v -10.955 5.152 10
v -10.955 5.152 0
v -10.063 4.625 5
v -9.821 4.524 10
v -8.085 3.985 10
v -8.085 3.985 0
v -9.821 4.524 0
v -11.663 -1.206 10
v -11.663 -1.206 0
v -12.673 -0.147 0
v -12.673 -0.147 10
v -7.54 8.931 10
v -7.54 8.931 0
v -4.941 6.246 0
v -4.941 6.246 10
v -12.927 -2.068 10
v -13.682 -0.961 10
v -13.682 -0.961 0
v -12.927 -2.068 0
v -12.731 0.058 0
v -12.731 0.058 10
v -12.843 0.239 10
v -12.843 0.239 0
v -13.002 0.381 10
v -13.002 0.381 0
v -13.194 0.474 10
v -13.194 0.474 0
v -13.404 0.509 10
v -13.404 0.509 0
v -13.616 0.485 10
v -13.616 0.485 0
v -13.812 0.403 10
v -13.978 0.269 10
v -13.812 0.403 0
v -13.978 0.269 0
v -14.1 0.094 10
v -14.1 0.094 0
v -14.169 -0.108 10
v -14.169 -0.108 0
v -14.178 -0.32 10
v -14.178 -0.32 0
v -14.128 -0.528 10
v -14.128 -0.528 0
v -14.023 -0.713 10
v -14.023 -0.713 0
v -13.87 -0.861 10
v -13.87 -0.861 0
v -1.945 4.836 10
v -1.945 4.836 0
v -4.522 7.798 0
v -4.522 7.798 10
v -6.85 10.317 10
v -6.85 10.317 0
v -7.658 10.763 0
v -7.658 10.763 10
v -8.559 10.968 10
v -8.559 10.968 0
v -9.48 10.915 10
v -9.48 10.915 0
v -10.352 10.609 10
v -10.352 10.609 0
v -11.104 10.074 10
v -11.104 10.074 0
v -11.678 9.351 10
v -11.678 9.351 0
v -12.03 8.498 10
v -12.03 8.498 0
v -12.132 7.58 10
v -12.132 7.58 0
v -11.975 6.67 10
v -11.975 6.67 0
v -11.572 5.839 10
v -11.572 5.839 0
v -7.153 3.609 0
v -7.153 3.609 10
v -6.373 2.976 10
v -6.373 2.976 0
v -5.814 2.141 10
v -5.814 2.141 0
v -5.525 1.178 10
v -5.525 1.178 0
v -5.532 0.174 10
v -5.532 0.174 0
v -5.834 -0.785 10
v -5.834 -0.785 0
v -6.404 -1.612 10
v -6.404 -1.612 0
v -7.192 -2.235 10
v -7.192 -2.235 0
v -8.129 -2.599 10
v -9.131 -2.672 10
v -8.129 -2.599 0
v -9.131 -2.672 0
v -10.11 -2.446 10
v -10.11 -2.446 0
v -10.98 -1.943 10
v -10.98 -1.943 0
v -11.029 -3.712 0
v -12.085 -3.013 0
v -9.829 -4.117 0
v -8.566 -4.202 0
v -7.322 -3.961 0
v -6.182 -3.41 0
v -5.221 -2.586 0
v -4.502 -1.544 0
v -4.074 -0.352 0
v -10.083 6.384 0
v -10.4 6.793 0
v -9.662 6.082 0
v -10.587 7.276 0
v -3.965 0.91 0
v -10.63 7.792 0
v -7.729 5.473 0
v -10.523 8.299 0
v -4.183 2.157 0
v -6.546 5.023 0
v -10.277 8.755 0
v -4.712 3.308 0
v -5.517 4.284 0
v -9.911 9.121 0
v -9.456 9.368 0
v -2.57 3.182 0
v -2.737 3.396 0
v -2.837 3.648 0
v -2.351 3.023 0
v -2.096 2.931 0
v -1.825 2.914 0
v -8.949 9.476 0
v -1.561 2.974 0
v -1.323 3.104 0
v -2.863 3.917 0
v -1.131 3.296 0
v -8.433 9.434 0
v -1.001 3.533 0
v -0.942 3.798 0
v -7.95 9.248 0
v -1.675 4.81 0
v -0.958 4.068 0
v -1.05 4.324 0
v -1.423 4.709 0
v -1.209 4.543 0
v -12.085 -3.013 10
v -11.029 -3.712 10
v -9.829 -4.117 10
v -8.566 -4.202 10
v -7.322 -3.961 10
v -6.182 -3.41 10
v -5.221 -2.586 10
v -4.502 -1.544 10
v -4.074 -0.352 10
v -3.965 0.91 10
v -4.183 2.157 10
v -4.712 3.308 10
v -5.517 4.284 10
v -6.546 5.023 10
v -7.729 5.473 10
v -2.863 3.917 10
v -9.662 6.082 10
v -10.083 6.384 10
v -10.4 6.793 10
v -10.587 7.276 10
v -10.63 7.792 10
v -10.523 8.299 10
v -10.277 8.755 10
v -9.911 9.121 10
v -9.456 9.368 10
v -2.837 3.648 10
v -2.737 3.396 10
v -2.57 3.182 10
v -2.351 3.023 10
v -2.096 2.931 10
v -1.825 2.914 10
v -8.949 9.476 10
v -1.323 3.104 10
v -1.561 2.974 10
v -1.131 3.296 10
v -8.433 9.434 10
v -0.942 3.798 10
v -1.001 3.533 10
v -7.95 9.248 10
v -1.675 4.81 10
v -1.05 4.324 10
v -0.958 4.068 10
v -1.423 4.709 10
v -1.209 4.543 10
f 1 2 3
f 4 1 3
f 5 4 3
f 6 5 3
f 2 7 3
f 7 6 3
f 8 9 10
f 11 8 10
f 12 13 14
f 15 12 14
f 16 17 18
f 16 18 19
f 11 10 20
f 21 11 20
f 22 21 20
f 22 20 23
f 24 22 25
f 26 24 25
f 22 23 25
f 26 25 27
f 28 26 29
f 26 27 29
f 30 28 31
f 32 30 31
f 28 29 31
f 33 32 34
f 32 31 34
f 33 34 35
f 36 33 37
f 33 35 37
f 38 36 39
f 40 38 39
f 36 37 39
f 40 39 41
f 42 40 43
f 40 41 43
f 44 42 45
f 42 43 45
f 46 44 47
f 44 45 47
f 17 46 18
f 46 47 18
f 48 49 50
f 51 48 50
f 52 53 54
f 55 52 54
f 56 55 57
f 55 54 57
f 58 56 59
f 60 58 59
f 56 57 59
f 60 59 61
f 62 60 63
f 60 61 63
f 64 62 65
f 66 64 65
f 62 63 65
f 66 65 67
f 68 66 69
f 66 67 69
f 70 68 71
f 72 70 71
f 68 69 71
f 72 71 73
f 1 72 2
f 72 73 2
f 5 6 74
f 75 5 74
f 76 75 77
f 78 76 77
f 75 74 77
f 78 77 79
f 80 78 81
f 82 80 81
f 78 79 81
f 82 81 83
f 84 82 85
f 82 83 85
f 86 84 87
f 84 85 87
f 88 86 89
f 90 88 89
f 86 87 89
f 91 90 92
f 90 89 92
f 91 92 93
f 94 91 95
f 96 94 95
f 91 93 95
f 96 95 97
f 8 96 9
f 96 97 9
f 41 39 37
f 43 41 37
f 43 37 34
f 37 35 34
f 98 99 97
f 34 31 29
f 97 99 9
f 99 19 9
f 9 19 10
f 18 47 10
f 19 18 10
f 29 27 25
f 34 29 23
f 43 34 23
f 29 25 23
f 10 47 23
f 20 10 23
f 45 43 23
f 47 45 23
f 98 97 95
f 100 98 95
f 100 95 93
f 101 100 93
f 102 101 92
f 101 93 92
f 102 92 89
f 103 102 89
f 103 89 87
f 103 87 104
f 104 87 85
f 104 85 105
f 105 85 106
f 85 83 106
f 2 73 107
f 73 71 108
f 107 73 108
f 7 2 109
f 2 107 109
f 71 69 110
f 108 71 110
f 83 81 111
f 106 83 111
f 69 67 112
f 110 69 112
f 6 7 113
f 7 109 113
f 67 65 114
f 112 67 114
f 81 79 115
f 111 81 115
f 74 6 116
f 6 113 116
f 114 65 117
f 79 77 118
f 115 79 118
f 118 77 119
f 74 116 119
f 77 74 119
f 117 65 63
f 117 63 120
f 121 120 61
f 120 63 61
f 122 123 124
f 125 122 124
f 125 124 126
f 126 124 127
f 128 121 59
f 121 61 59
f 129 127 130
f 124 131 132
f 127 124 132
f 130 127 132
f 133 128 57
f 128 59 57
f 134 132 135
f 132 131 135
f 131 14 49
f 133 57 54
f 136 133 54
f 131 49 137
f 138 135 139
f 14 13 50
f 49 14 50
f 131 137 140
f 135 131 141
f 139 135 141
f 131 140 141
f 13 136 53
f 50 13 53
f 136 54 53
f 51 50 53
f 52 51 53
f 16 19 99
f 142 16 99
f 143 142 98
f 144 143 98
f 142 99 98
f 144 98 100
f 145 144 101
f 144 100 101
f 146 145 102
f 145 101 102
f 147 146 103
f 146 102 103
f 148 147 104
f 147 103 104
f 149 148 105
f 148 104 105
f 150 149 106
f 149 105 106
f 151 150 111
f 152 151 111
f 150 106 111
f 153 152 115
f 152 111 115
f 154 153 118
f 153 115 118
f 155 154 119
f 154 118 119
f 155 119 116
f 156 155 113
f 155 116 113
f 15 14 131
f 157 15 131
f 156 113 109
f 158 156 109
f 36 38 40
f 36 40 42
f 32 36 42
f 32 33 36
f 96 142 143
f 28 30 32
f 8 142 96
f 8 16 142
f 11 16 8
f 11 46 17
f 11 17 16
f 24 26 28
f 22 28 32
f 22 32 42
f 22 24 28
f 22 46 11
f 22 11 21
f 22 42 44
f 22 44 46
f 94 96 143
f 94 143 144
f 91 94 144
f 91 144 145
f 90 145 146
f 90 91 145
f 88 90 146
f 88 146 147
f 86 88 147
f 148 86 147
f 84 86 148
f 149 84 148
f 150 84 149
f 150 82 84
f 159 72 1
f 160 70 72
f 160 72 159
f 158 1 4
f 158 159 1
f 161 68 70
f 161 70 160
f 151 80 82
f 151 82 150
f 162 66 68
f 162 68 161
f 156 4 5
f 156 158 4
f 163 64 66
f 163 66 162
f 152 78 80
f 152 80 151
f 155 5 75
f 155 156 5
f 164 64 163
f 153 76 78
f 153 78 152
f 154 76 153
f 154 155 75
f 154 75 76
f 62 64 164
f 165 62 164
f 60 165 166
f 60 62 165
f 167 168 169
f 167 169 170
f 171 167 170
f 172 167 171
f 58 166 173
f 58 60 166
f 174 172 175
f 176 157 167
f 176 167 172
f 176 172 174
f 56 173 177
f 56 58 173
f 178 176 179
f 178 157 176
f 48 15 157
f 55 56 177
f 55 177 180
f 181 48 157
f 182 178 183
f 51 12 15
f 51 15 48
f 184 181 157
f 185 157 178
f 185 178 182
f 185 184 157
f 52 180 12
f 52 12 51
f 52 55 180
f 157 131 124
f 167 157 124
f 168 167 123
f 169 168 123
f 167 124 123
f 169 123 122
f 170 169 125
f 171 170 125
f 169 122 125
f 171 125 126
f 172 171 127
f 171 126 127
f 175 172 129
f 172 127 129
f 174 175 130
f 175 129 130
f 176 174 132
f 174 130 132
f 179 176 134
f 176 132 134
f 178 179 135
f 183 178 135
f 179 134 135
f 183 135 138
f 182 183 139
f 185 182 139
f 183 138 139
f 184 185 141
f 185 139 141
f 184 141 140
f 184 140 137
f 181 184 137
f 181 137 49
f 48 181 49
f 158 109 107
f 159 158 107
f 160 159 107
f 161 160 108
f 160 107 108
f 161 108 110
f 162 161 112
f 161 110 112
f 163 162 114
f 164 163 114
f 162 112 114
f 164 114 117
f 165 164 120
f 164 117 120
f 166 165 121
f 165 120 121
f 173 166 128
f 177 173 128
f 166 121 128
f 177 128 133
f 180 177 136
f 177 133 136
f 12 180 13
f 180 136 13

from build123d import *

# Parameters (mm, degrees)
F1_DEPTH = 10


with BuildPart() as f1:
    # F0 (on Top) → F1 (new body)
    with BuildSketch(Plane.XY):
        with BuildLine():
            ThreePointArc((-9.6618913839, 6.0816285435), (-10.2767491333, 8.754632337), (-7.5396319115, 8.9312354108))
            Line((-7.5396319115, 8.9312354108), (-4.9405973193, 6.2455355452))
            Line((-4.9405973193, 6.2455355452), (-2.8629372828, 3.9173089899))
            ThreePointArc((-2.8629372828, 3.9173089899), (-1.2204668488, 3.1932707933), (-1.9445042126, 4.8357415944))
            Line((-1.9445042126, 4.8357415944), (-4.5220414177, 7.7984281816))
            Line((-4.5220414177, 7.7984281816), (-6.8499312622, 10.3170876293))
            ThreePointArc((-6.8499312622, 10.3170876293), (-11.4164551285, 9.7328706229), (-10.9552195609, 5.1522908034))
            add(Edge.make_bspline(
                [(-10.9552195609, 5.1522908034), (-10.6926542112, 4.9714270901), (-10.058152243, 4.5343611094), (-8.8142262778, 4.1882031461), (-8.0850534141, 3.9852899499)],
                knots=[0, 0, 0, 0, 0.4138132943, 1, 1, 1, 1], degree=3))
            ThreePointArc((-8.0850534141, 3.9852899499), (-6.0877209286, -1.2198178636), (-11.662869985, -1.2057677011))
            Line((-11.662869985, -1.2057677011), (-12.6730389893, -0.1474826422))
            ThreePointArc((-12.6730389893, -0.1474826422), (-13.8998387132, 0.3415873294), (-13.6815843859, -0.9609456062))
            Line((-13.6815843859, -0.9609456062), (-12.9269978385, -2.067672831))
            ThreePointArc((-12.9269978385, -2.067672831), (-4.8279533498, -2.0880835662), (-7.7294873707, 5.4734003194))
            Line((-7.7294873707, 5.4734003194), (-9.6618913839, 6.0816285435))
        make_face()
    extrude(amount=F1_DEPTH)


solid = f1.part
